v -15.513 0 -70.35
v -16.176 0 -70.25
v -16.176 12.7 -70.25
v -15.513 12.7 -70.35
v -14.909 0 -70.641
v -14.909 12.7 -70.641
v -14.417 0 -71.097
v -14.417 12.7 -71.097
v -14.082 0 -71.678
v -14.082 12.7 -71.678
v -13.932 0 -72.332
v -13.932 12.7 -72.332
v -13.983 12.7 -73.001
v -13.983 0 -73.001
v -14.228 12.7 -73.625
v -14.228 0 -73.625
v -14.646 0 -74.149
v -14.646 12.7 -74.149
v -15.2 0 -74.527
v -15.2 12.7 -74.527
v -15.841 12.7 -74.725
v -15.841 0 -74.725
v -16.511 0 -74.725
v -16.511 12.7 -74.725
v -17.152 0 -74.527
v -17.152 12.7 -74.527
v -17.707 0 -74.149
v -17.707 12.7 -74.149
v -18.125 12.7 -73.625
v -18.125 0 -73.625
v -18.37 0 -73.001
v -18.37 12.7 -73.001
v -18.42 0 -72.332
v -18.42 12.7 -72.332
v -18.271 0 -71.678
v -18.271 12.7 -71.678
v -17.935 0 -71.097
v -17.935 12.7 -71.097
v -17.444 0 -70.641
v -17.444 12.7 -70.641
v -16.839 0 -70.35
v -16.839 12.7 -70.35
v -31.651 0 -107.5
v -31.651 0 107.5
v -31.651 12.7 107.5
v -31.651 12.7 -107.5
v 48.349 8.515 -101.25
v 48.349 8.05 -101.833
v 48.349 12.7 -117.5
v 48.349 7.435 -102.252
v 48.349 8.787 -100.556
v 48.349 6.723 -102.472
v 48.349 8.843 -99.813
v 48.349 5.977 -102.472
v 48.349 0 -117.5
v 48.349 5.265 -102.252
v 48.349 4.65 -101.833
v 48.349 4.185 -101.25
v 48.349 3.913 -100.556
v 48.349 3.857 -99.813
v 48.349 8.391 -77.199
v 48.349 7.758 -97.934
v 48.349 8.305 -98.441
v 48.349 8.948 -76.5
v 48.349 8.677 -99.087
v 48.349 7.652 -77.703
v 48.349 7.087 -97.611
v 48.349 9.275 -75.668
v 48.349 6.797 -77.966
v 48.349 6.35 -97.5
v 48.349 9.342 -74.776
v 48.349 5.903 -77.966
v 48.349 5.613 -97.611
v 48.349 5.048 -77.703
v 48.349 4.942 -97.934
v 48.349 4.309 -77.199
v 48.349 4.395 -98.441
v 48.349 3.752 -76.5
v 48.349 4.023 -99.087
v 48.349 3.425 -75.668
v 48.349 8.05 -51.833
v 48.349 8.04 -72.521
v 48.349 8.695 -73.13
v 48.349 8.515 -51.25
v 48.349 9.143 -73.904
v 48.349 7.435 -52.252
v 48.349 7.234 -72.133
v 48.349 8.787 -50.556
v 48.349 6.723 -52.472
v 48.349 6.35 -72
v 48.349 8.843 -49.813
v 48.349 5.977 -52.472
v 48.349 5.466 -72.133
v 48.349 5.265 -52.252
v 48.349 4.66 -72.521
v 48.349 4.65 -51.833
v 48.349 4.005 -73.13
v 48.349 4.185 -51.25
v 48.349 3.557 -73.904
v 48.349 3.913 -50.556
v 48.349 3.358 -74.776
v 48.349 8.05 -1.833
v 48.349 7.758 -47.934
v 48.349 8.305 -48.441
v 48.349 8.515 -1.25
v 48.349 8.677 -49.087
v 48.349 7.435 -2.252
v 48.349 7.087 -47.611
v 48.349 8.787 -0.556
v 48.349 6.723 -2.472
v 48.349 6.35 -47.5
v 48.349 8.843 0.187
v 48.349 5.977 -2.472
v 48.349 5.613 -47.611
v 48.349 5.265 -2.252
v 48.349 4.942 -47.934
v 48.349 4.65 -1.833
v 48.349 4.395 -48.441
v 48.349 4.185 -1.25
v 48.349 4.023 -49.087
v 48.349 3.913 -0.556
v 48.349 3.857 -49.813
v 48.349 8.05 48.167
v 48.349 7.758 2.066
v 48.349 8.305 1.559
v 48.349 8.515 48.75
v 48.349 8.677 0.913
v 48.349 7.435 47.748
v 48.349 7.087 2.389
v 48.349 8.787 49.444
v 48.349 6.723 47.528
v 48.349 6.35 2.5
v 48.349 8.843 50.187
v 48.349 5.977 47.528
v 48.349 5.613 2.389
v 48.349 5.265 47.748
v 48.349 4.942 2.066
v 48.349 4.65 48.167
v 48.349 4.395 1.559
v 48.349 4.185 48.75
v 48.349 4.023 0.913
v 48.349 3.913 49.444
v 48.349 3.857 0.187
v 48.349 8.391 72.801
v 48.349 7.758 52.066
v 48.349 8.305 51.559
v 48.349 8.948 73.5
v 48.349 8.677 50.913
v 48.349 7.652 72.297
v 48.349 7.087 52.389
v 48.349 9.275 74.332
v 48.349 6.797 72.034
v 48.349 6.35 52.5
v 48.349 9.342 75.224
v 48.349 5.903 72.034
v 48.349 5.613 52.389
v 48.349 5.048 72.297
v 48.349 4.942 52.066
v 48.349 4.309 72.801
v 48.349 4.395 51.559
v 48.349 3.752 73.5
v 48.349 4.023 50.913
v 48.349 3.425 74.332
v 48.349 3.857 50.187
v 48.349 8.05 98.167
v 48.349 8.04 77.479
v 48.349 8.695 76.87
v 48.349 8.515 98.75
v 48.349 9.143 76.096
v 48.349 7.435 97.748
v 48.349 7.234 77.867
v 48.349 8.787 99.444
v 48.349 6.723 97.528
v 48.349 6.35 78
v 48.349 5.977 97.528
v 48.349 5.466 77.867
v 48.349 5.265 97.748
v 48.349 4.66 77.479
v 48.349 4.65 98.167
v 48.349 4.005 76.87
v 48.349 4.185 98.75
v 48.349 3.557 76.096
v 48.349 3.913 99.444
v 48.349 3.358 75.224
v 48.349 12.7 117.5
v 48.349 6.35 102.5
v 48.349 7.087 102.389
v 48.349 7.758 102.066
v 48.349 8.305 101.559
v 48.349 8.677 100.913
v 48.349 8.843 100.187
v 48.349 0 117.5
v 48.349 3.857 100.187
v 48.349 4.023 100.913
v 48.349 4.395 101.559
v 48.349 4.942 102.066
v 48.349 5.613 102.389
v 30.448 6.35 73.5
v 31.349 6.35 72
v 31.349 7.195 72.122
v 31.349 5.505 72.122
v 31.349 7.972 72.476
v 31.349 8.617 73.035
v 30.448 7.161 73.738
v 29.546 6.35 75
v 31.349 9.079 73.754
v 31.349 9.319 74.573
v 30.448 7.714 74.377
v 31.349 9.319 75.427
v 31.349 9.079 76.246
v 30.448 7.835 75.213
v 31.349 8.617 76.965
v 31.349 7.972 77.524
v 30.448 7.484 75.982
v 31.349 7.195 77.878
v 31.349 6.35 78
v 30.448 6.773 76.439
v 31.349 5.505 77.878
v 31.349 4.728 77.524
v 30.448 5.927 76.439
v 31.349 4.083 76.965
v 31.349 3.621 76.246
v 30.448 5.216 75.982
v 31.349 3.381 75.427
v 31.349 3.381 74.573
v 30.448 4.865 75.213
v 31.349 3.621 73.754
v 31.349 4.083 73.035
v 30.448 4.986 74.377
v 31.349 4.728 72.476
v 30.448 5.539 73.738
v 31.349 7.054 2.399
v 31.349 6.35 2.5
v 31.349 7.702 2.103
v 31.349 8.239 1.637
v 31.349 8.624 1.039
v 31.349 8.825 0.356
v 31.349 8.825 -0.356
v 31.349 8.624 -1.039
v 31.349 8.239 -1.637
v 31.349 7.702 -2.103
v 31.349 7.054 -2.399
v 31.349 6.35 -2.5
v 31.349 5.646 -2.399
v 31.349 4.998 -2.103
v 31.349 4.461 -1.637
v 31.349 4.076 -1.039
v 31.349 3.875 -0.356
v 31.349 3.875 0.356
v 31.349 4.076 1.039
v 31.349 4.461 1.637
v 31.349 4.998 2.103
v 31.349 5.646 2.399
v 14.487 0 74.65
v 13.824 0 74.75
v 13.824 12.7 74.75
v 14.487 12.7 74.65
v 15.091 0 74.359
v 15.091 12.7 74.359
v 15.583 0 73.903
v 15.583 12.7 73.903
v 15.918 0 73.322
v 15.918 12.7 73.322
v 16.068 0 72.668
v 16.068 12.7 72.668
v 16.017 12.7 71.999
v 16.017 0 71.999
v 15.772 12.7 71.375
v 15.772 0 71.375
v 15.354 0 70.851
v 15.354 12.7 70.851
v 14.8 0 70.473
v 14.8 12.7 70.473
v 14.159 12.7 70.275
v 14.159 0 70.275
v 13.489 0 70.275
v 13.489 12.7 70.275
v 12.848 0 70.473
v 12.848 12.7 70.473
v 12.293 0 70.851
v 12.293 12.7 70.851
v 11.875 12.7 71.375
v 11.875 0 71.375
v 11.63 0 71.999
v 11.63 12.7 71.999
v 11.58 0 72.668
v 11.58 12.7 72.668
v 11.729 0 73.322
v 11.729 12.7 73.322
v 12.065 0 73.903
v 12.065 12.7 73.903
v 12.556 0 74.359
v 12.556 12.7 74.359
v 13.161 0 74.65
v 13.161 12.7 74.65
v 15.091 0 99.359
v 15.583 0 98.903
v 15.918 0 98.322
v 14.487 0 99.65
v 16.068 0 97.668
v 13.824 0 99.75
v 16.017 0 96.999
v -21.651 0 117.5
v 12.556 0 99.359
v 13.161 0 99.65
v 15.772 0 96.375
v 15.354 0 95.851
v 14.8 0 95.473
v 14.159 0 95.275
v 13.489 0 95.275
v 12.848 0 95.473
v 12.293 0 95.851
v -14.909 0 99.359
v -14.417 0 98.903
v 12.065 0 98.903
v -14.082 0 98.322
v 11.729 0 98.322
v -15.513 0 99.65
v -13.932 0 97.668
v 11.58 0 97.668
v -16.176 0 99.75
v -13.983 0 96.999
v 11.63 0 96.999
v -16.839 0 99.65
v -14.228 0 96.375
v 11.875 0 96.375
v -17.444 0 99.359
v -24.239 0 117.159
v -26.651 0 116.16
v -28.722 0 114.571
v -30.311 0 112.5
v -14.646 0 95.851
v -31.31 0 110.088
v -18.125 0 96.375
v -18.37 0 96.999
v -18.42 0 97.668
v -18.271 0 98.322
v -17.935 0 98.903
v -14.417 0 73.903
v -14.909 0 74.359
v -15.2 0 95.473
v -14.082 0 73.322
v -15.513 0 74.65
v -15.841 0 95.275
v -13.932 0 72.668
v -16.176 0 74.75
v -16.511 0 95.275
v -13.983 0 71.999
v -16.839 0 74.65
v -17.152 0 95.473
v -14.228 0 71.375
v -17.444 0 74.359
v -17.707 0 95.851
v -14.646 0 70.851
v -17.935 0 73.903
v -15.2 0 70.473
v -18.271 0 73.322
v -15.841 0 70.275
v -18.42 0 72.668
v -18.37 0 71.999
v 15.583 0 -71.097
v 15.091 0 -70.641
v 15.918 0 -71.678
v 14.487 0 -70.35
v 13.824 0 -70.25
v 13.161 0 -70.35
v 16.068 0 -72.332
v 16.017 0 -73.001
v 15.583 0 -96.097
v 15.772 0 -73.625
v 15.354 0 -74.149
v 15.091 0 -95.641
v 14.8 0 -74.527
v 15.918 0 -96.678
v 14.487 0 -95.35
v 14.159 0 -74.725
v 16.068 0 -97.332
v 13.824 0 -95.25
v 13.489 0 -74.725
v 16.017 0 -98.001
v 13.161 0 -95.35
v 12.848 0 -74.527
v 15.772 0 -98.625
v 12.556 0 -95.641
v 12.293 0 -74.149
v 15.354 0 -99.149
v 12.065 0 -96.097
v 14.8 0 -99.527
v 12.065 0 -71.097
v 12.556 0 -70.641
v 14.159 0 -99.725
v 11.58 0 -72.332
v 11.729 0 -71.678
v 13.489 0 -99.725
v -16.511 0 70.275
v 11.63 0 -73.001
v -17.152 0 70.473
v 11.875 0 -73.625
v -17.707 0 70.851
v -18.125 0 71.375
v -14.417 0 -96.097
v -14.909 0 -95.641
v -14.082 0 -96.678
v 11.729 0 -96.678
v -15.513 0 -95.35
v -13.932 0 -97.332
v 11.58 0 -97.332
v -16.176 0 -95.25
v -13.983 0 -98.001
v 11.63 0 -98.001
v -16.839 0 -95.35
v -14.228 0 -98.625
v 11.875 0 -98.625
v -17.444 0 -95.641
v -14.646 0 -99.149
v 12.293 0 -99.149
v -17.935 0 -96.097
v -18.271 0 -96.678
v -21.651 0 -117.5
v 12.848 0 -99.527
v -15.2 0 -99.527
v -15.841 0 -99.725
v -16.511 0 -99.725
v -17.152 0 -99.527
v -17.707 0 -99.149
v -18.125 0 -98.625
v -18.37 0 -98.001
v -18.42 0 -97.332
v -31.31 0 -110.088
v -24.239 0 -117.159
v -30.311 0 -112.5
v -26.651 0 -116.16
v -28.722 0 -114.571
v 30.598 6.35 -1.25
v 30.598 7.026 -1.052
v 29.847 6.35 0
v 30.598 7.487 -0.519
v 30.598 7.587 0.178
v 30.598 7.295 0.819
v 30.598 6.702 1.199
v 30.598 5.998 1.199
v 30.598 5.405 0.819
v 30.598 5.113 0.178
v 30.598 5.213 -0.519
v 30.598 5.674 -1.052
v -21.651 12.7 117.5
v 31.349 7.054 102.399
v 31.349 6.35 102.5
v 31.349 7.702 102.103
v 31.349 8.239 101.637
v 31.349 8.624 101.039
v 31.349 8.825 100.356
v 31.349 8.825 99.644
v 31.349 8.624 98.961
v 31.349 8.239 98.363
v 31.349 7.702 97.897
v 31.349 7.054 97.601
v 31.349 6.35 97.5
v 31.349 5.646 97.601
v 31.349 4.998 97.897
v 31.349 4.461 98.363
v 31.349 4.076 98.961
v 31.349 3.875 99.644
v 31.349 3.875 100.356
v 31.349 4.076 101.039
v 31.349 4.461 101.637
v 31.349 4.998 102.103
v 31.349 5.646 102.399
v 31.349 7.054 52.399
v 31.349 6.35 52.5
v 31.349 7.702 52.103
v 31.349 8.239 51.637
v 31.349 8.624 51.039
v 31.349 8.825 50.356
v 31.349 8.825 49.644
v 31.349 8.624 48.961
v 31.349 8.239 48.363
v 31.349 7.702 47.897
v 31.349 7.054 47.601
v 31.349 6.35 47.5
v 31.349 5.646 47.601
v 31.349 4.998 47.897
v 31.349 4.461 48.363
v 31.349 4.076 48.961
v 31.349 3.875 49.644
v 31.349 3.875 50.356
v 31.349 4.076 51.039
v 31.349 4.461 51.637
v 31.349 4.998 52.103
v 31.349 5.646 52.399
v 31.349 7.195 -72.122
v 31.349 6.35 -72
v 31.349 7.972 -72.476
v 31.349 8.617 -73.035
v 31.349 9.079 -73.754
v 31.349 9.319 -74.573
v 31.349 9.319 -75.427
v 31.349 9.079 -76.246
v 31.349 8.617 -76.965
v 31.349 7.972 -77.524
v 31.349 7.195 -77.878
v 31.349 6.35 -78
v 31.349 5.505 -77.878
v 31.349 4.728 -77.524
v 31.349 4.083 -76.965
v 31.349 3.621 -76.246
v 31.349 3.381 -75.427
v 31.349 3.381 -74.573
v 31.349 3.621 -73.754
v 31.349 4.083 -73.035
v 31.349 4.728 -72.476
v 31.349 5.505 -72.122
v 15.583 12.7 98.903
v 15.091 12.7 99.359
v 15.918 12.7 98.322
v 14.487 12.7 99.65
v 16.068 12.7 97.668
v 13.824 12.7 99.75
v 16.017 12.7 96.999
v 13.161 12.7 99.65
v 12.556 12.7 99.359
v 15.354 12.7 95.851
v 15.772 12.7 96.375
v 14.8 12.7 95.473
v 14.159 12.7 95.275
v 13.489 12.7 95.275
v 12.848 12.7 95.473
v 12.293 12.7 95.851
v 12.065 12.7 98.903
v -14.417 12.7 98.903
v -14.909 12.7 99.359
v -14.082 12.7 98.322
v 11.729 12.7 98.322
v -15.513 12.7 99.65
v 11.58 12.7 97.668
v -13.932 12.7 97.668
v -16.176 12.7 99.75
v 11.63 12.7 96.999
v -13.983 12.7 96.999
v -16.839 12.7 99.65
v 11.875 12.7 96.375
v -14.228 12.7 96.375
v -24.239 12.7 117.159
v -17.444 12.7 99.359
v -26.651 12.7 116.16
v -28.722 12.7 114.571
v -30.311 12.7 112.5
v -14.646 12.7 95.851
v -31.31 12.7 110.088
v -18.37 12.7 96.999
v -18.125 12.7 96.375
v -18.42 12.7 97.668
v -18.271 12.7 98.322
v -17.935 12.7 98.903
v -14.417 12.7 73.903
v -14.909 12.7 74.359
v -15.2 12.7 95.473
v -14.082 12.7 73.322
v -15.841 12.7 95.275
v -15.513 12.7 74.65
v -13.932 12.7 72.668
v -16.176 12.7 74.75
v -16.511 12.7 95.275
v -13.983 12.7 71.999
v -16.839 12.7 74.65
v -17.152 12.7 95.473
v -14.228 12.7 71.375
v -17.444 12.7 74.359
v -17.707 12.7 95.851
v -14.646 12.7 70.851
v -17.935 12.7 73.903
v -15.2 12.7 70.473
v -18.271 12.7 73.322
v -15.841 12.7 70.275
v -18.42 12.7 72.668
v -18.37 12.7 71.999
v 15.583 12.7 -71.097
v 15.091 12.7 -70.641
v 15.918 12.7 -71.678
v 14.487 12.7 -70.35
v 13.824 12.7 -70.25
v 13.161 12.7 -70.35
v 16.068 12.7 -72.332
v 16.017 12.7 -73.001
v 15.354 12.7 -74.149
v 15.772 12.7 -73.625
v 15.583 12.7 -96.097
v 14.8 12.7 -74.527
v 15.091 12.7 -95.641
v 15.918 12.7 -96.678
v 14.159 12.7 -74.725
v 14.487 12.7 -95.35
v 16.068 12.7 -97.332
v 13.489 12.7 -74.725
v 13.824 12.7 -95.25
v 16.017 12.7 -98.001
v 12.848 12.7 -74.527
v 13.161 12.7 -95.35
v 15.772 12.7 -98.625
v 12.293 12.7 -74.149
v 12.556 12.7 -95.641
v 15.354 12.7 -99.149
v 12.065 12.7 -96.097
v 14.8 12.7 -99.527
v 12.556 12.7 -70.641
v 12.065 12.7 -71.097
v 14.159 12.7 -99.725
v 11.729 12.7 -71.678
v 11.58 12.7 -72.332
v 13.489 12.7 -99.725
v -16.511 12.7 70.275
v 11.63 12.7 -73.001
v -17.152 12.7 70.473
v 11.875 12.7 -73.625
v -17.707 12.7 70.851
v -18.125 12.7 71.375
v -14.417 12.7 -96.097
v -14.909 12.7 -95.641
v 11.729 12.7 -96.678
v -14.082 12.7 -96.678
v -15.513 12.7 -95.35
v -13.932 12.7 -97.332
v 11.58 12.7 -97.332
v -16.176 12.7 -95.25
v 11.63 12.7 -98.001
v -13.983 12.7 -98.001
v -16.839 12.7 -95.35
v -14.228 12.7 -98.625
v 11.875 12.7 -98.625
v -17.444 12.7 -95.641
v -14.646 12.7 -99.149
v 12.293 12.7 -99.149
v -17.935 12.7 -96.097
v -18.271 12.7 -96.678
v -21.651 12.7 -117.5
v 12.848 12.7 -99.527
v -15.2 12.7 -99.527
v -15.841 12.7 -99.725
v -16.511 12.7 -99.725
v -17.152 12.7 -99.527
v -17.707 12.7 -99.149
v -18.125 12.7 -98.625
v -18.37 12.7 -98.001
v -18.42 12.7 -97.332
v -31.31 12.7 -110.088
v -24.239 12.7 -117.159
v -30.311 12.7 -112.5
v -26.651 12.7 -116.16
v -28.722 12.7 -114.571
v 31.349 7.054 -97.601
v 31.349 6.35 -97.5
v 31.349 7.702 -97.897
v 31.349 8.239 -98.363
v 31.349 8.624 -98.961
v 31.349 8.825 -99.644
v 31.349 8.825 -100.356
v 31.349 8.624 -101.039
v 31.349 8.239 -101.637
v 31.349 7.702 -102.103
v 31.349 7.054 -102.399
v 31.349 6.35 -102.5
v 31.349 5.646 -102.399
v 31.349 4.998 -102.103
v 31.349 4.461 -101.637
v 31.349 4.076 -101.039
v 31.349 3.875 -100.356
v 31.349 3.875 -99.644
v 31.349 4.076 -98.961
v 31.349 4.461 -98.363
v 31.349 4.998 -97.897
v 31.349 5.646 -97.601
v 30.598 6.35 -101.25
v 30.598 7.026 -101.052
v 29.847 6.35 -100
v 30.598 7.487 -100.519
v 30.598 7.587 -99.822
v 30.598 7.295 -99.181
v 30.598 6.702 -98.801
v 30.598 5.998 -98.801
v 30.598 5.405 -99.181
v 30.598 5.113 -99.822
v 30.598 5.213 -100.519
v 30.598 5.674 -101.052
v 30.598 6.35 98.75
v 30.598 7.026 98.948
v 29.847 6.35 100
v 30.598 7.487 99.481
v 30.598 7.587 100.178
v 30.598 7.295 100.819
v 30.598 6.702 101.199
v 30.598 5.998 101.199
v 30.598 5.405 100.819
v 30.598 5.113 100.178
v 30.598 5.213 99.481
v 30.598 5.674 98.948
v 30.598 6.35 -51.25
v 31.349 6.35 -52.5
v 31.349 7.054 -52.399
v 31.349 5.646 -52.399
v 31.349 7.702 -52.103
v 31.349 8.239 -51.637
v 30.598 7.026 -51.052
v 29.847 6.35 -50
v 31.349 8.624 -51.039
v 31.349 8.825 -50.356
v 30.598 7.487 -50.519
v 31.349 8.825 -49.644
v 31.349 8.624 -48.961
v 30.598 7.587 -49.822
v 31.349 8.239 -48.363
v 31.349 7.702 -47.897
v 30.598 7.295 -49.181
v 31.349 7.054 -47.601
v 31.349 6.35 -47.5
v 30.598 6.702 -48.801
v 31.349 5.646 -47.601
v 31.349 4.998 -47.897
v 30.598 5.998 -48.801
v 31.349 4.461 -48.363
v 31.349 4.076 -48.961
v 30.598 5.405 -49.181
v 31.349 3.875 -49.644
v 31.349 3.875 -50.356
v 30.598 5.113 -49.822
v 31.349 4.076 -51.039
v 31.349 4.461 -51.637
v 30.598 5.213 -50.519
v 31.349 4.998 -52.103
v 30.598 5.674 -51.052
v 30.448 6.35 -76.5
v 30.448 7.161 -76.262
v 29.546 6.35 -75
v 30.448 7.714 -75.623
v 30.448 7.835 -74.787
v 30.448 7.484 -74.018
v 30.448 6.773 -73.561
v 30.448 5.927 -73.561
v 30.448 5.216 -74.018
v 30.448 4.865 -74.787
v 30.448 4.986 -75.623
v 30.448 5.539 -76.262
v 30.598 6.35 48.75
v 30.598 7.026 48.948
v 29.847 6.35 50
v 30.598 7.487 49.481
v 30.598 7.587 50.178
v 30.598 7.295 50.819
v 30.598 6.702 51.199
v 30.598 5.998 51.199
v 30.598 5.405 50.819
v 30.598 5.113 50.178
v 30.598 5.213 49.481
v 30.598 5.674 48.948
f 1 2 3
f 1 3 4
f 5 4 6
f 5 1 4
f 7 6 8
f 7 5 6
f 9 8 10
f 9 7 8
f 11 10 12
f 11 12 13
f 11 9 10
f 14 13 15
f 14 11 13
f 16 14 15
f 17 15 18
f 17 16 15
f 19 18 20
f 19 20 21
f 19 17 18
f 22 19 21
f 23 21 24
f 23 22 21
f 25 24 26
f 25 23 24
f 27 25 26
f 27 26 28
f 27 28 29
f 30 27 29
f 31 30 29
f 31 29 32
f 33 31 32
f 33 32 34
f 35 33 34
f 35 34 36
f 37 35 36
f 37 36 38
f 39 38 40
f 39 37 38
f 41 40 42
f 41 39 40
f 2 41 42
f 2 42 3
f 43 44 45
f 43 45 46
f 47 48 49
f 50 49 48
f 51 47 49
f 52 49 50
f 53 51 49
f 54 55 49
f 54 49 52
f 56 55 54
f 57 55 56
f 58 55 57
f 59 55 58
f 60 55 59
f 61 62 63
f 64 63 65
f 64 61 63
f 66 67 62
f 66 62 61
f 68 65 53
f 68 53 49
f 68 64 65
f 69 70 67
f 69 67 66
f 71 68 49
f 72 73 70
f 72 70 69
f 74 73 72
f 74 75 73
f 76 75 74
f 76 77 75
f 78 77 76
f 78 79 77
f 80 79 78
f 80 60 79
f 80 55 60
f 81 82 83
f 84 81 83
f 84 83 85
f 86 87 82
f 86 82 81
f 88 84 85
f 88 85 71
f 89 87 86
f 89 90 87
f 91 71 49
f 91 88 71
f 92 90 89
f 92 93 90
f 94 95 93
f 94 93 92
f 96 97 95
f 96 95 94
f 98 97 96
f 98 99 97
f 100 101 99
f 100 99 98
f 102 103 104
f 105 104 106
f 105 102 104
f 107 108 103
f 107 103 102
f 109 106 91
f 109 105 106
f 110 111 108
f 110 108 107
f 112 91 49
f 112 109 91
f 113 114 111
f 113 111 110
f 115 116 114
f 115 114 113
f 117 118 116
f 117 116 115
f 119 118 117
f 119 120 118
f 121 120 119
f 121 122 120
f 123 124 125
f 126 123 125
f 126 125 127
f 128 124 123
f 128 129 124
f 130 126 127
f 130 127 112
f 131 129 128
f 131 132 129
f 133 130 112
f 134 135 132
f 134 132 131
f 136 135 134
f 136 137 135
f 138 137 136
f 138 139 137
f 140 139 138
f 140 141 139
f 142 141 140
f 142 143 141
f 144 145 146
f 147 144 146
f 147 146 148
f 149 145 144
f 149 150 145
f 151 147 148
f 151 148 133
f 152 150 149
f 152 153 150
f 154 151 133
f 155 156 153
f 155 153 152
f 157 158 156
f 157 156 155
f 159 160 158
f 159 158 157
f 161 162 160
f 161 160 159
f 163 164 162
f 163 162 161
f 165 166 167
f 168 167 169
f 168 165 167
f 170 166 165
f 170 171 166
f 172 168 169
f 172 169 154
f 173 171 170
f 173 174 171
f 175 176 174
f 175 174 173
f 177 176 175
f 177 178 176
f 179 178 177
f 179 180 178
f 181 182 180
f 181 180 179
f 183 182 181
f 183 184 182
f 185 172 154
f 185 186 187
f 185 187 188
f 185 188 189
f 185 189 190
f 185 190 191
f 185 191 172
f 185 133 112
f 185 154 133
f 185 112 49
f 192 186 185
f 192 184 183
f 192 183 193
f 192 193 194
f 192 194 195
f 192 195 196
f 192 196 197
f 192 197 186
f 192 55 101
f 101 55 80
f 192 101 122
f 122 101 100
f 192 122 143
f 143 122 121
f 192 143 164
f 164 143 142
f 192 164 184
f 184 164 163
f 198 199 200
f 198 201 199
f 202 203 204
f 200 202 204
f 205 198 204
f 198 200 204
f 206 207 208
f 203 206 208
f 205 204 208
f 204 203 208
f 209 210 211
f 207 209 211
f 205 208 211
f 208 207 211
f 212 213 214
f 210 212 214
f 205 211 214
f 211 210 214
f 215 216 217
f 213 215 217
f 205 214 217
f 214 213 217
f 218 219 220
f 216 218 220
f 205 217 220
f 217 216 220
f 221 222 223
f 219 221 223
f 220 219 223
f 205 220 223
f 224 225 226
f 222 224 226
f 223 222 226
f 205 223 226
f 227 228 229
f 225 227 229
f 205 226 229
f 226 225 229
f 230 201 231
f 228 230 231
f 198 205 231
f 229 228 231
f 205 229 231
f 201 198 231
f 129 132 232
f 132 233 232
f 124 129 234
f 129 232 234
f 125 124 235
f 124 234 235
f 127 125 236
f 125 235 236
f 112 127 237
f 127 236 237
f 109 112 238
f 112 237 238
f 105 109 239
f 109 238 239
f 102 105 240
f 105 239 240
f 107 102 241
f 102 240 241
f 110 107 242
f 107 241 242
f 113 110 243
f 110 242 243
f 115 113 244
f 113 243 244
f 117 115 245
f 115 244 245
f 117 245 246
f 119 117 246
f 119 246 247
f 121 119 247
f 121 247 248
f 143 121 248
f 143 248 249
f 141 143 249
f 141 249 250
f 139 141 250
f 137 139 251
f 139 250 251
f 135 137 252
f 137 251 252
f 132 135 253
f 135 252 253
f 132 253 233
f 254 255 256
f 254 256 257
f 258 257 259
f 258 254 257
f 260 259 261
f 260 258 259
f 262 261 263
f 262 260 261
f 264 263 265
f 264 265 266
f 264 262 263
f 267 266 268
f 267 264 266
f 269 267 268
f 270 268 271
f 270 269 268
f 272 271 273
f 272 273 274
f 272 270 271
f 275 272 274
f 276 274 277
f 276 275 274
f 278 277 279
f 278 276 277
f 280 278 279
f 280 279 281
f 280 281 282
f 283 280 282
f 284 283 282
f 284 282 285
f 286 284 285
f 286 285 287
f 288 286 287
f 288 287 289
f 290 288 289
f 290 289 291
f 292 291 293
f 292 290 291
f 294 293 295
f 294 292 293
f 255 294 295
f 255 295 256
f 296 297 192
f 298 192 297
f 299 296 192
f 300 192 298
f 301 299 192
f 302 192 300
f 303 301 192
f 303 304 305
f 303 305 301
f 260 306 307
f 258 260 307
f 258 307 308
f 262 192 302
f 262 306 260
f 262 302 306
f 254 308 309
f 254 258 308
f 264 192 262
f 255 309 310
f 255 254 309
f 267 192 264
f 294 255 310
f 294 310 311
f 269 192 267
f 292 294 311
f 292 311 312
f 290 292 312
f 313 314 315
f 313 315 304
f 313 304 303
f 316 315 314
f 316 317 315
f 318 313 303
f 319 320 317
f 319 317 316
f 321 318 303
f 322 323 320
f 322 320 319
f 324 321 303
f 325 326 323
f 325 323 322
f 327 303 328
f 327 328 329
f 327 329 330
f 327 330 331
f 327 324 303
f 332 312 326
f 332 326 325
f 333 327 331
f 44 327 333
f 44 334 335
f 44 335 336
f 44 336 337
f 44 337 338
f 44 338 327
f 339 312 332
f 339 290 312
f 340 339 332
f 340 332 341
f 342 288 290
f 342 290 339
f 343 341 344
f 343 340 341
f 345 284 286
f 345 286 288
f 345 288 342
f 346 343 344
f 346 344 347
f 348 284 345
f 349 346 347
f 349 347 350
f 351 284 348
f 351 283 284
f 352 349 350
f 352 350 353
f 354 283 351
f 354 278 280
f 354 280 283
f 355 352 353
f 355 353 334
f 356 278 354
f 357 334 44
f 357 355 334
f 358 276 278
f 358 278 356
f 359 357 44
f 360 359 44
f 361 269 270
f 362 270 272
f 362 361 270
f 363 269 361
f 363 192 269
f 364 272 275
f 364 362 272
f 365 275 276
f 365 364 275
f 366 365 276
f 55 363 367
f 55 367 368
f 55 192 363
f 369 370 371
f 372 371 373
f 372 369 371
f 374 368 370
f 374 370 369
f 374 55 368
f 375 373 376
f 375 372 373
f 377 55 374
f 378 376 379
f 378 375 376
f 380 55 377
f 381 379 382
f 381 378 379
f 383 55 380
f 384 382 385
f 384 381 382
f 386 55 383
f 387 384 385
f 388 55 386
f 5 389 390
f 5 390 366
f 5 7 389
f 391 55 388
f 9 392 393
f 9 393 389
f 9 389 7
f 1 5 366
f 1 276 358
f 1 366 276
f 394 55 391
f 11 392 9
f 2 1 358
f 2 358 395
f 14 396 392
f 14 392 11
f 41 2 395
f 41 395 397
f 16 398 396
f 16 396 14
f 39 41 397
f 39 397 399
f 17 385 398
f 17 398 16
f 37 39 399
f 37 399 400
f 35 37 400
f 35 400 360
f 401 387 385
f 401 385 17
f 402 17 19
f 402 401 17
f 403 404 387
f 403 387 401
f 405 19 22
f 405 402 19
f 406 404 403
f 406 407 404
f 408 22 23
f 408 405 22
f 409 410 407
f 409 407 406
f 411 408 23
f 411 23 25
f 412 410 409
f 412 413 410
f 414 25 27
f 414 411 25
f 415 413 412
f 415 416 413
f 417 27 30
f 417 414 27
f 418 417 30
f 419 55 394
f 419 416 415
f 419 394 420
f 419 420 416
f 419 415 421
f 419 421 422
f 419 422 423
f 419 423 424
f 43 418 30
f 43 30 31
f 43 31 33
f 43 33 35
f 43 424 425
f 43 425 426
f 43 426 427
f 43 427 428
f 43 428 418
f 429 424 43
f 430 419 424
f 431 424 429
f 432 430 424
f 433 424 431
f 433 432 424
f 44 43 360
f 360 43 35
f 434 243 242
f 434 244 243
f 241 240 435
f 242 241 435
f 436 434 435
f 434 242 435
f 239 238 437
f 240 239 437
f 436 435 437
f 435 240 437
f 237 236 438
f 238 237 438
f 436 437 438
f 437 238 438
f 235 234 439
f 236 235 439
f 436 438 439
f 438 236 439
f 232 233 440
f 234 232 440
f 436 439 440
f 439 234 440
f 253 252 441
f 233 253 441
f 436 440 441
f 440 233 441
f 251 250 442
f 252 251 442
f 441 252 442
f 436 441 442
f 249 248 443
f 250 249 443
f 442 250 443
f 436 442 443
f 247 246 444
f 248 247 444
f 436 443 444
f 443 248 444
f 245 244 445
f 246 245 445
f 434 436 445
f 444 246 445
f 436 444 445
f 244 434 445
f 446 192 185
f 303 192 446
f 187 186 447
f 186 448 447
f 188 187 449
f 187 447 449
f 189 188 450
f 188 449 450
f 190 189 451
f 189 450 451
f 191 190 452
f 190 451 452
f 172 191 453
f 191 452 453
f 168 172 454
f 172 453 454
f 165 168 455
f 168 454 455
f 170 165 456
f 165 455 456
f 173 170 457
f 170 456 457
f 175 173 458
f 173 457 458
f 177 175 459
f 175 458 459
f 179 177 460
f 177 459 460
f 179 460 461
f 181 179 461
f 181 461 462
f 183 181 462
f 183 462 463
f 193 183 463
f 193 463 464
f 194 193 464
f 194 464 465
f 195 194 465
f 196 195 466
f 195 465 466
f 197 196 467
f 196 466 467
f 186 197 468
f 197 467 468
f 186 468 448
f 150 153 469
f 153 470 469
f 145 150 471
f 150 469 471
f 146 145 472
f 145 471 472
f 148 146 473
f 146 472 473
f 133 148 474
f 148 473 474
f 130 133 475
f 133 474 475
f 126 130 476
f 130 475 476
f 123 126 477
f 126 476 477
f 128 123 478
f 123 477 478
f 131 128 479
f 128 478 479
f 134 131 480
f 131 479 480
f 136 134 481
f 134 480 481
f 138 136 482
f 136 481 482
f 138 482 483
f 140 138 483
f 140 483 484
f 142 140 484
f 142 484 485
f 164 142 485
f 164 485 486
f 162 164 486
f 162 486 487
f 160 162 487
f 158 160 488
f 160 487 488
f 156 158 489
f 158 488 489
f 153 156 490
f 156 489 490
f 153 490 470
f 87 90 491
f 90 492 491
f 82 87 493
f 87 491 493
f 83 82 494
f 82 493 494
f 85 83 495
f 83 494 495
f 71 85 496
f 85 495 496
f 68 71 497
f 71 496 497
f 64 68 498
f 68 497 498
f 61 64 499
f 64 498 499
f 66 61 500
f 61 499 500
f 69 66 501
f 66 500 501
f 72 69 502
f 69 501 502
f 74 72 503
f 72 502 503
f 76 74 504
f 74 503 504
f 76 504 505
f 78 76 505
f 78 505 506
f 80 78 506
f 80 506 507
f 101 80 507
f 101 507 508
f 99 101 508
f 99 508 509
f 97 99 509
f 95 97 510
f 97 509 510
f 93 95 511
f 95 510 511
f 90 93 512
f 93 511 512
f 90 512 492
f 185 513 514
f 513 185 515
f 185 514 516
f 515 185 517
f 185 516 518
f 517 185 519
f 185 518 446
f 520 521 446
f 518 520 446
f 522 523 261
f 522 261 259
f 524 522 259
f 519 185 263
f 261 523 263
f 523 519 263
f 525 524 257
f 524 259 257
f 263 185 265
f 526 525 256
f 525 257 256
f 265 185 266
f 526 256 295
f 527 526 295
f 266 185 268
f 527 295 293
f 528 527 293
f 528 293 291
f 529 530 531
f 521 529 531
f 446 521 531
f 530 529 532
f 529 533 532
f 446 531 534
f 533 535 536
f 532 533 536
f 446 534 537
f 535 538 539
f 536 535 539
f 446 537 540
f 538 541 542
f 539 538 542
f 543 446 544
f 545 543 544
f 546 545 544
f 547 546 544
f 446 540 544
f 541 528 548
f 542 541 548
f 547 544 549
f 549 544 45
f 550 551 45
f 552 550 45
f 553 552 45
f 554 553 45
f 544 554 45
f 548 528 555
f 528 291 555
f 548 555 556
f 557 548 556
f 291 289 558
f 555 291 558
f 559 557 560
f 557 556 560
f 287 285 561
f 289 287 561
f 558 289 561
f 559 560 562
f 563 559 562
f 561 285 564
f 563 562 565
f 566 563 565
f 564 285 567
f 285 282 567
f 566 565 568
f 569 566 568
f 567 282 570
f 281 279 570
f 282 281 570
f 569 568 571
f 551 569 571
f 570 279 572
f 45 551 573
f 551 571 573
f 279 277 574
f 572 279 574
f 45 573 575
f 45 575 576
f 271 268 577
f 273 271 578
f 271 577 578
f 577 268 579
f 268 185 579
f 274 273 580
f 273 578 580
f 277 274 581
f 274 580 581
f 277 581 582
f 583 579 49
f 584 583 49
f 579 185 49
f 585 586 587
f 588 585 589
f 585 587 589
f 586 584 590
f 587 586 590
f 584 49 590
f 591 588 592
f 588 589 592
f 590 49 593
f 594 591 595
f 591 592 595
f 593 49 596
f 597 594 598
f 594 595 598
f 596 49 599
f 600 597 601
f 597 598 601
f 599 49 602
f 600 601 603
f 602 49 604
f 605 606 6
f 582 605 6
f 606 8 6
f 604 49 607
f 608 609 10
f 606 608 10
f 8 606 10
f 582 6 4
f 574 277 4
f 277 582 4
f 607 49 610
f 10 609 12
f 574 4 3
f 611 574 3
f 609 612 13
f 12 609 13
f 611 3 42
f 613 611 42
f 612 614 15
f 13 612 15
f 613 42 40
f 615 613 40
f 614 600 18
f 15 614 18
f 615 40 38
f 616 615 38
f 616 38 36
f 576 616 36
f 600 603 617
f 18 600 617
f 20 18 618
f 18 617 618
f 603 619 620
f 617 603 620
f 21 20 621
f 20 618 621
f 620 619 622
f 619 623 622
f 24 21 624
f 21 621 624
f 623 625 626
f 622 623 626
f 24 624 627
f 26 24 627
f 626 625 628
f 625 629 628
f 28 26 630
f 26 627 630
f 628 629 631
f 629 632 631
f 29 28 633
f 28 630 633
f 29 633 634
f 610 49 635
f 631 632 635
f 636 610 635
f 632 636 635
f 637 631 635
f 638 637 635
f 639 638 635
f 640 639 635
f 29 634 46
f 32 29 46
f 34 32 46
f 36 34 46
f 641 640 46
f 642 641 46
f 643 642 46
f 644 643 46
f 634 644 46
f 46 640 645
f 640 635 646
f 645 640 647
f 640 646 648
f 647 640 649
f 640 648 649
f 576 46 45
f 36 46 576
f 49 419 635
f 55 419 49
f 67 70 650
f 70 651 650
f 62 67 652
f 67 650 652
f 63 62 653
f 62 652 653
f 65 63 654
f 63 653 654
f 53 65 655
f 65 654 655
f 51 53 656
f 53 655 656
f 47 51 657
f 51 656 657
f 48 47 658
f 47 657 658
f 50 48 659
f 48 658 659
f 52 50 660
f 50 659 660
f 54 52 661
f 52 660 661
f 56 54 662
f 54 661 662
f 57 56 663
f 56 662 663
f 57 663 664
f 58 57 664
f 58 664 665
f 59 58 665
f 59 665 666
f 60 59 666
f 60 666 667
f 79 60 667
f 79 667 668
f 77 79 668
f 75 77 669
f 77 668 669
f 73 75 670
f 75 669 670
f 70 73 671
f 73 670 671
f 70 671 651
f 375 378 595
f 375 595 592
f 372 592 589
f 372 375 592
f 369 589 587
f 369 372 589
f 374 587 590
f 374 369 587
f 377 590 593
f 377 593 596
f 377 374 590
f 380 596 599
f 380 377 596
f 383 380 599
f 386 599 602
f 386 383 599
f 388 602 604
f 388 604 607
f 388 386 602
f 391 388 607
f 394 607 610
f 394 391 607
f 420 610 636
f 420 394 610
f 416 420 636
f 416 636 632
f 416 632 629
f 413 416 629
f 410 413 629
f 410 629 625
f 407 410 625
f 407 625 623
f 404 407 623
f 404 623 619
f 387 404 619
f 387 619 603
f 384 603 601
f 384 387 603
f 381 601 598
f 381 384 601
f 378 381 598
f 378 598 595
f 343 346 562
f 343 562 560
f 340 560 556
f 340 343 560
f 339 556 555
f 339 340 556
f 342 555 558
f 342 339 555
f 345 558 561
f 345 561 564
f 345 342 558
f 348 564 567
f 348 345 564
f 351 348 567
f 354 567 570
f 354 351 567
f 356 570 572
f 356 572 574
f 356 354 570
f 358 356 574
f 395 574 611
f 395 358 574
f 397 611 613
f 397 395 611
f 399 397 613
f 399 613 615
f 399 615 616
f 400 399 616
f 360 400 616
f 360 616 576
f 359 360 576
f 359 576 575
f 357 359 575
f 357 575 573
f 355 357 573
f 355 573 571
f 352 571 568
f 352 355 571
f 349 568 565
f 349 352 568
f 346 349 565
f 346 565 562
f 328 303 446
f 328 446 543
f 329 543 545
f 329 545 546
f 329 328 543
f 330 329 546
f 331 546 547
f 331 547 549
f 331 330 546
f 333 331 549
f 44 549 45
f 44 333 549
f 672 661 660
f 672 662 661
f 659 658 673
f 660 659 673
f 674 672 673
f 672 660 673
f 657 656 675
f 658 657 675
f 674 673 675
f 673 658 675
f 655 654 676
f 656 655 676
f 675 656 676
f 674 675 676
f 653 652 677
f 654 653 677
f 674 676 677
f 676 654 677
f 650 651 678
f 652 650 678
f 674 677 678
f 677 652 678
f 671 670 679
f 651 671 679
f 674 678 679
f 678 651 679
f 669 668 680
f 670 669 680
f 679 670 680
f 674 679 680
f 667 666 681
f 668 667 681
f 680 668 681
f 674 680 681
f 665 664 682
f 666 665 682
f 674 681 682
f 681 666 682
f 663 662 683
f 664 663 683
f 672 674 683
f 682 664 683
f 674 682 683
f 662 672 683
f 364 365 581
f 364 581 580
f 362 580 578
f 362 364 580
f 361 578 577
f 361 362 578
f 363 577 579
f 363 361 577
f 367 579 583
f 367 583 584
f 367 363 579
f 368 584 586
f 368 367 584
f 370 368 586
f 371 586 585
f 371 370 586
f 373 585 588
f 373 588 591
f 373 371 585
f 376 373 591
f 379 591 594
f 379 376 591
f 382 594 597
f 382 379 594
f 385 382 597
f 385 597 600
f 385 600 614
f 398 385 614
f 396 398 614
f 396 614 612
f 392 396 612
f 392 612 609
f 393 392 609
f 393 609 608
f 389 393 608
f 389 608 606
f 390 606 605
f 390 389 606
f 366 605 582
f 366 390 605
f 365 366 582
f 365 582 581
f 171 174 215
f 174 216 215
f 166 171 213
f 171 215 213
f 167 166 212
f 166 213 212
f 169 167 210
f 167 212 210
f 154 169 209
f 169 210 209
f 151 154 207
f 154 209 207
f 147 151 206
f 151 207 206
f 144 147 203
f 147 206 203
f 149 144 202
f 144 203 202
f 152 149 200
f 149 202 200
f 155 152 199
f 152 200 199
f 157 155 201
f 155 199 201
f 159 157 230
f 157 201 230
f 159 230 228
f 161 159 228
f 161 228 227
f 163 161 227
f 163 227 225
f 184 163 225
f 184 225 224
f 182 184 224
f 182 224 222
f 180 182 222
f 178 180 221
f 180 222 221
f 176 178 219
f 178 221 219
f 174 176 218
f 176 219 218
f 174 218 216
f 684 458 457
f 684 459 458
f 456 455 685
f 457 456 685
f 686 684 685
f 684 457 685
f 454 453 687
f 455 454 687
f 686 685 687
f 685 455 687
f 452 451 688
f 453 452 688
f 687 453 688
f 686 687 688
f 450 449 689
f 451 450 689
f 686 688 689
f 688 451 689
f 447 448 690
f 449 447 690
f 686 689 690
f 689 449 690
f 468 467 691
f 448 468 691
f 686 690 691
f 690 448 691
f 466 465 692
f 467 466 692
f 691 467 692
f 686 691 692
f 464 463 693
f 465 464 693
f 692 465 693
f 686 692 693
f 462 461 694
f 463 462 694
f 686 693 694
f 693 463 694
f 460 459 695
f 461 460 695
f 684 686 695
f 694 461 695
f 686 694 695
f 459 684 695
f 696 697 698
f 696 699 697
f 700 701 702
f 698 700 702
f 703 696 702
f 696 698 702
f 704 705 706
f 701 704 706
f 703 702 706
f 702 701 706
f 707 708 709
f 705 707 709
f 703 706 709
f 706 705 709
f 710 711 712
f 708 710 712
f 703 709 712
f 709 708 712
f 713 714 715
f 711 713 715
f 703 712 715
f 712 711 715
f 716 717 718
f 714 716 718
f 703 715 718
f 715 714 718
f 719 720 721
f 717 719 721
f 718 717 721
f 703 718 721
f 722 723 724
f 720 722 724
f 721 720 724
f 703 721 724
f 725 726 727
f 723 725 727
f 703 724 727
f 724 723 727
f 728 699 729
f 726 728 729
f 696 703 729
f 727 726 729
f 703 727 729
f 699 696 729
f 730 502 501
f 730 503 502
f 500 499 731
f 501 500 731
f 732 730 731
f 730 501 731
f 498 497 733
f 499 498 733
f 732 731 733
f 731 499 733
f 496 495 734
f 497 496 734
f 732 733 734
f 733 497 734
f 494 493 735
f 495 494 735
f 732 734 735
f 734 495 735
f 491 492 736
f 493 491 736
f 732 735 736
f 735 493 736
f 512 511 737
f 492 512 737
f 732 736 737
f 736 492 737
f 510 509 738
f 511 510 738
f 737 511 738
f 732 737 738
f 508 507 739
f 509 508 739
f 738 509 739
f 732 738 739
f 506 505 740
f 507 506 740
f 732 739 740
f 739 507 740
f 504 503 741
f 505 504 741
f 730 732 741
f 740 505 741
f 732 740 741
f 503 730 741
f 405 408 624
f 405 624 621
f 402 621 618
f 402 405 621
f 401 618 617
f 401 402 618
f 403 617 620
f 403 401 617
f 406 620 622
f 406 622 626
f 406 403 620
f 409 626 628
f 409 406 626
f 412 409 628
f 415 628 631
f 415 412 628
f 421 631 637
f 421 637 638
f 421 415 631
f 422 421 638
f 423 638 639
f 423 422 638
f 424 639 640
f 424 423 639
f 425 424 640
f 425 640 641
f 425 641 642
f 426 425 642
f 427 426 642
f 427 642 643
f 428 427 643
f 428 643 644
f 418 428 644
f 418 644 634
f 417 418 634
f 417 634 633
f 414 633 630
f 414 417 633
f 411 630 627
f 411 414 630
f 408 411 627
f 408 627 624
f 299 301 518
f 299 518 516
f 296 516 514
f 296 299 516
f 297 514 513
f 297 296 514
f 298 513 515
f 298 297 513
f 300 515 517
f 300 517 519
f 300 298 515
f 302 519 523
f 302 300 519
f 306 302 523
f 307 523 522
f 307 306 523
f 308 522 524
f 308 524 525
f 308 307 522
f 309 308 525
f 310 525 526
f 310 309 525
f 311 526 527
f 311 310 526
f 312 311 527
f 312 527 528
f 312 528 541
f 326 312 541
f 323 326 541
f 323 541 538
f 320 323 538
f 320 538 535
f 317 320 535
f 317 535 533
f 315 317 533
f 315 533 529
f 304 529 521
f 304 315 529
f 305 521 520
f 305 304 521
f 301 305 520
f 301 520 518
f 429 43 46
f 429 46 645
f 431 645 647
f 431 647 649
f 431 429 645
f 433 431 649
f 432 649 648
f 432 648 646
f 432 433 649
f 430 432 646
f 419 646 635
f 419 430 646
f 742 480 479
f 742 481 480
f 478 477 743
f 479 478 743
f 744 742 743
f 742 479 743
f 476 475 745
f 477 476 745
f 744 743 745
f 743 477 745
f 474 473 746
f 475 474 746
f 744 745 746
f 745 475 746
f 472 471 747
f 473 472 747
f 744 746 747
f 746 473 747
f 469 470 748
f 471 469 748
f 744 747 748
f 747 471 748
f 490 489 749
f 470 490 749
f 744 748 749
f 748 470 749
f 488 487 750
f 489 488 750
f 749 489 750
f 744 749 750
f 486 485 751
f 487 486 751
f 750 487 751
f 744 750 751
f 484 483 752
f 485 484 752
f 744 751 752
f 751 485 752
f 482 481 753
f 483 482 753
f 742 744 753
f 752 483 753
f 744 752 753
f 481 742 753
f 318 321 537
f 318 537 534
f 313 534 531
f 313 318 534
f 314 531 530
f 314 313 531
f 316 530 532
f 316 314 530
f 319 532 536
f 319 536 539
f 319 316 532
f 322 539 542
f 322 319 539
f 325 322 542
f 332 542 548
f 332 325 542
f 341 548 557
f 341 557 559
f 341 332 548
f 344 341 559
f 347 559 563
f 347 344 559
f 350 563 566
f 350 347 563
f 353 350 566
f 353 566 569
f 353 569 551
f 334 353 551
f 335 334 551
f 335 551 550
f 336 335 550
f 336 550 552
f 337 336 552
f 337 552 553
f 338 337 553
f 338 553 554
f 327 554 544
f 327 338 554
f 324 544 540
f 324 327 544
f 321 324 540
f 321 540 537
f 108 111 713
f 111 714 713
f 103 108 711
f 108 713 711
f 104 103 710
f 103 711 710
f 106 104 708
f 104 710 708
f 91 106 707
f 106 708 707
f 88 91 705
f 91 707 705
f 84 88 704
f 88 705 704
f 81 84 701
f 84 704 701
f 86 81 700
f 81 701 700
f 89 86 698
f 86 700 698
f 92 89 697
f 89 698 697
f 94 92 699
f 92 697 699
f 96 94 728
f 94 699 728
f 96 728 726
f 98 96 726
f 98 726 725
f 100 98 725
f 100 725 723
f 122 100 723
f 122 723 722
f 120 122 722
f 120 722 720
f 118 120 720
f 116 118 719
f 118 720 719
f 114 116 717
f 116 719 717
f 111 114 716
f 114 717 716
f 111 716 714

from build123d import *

# Parameters (mm, degrees)
SKETCH1_R                       = 2.25
BOSS_EXTRUDE1_DEPTH             = 12.7
TAP_DRILL_FOR_M6X1_0_TAP1_D     = 5
TAP_DRILL_FOR_M6X1_0_TAP1_DEPTH = 17
TAP_DRILL_FOR_M6X1_0_TAP1_TIP   = 1.502151548
F_6_0MM_DOWEL_HOLE1_D           = 6
F_6_0MM_DOWEL_HOLE1_DEPTH       = 17
F_6_0MM_DOWEL_HOLE1_TIP         = 1.802581857


with BuildPart() as part:
    # Sketch1 → Boss-Extrude1 (new body)
    with BuildSketch(Plane(origin=(0, 0, 0), x_dir=(1, 0, 0), z_dir=(0, 1, 0))):
        with BuildLine():
            Line((48.34884719, 117.5), (48.34884719, -117.5))
            Line((48.34884719, -117.5), (-21.65115281, -117.5))
            ThreePointArc((-21.65115281, -117.5), (-28.722220622, -114.571067812), (-31.65115281, -107.5))
            Line((-31.65115281, -107.5), (-31.65115281, 107.5))
            ThreePointArc((-31.65115281, 107.5), (-28.722220622, 114.571067812), (-21.65115281, 117.5))
            Line((-21.65115281, 117.5), (48.34884719, 117.5))
        make_face()
        with Locations(Location((-16.17615281, -97.5, 0), (0, 0, 270))):
            Circle(SKETCH1_R, mode=Mode.SUBTRACT)
        with Locations(Location((13.82384719, -97.5, 0), (0, 0, 270))):
            Circle(SKETCH1_R, mode=Mode.SUBTRACT)
        with Locations(Location((13.82384719, -72.5, 0), (0, 0, 270))):
            Circle(SKETCH1_R, mode=Mode.SUBTRACT)
        with Locations(Location((-16.17615281, -72.5, 0), (0, 0, 270))):
            Circle(SKETCH1_R, mode=Mode.SUBTRACT)
        with Locations(Location((-16.17615281, 72.5, 0), (0, 0, 270))):
            Circle(SKETCH1_R, mode=Mode.SUBTRACT)
        with Locations(Location((-16.17615281, 97.5, 0), (0, 0, 270))):
            Circle(SKETCH1_R, mode=Mode.SUBTRACT)
        with Locations(Location((13.82384719, 97.5, 0), (0, 0, 270))):
            Circle(SKETCH1_R, mode=Mode.SUBTRACT)
        with Locations(Location((13.82384719, 72.5, 0), (0, 0, 270))):
            Circle(SKETCH1_R, mode=Mode.SUBTRACT)
    extrude(amount=BOSS_EXTRUDE1_DEPTH)

    # Tap Drill for M6x1.0 Tap1
    with Locations(Plane(origin=(48.34884719, 0, 0), x_dir=(0, 0, -1), z_dir=(1, 0, 0))):
        with Locations((-100, 6.35), (-50, 6.35), (0, 6.35), (50, 6.35), (100, 6.35)):
            Hole(TAP_DRILL_FOR_M6X1_0_TAP1_D / 2, depth=TAP_DRILL_FOR_M6X1_0_TAP1_DEPTH)
            with Locations((0, 0, -(TAP_DRILL_FOR_M6X1_0_TAP1_DEPTH + TAP_DRILL_FOR_M6X1_0_TAP1_TIP / 2))):  # 118° drill point
                Cone(0, TAP_DRILL_FOR_M6X1_0_TAP1_D / 2, TAP_DRILL_FOR_M6X1_0_TAP1_TIP, mode=Mode.SUBTRACT)

    # Ø6.0mm Dowel Hole1
    with Locations(Plane(origin=(48.34884719, 0, 0), x_dir=(0, 0, -1), z_dir=(1, 0, 0))):
        with Locations((-75, 6.35), (75, 6.35)):
            Hole(F_6_0MM_DOWEL_HOLE1_D / 2, depth=F_6_0MM_DOWEL_HOLE1_DEPTH)
            with Locations((0, 0, -(F_6_0MM_DOWEL_HOLE1_DEPTH + F_6_0MM_DOWEL_HOLE1_TIP / 2))):  # 118° drill point
                Cone(0, F_6_0MM_DOWEL_HOLE1_D / 2, F_6_0MM_DOWEL_HOLE1_TIP, mode=Mode.SUBTRACT)


solid = part.part
